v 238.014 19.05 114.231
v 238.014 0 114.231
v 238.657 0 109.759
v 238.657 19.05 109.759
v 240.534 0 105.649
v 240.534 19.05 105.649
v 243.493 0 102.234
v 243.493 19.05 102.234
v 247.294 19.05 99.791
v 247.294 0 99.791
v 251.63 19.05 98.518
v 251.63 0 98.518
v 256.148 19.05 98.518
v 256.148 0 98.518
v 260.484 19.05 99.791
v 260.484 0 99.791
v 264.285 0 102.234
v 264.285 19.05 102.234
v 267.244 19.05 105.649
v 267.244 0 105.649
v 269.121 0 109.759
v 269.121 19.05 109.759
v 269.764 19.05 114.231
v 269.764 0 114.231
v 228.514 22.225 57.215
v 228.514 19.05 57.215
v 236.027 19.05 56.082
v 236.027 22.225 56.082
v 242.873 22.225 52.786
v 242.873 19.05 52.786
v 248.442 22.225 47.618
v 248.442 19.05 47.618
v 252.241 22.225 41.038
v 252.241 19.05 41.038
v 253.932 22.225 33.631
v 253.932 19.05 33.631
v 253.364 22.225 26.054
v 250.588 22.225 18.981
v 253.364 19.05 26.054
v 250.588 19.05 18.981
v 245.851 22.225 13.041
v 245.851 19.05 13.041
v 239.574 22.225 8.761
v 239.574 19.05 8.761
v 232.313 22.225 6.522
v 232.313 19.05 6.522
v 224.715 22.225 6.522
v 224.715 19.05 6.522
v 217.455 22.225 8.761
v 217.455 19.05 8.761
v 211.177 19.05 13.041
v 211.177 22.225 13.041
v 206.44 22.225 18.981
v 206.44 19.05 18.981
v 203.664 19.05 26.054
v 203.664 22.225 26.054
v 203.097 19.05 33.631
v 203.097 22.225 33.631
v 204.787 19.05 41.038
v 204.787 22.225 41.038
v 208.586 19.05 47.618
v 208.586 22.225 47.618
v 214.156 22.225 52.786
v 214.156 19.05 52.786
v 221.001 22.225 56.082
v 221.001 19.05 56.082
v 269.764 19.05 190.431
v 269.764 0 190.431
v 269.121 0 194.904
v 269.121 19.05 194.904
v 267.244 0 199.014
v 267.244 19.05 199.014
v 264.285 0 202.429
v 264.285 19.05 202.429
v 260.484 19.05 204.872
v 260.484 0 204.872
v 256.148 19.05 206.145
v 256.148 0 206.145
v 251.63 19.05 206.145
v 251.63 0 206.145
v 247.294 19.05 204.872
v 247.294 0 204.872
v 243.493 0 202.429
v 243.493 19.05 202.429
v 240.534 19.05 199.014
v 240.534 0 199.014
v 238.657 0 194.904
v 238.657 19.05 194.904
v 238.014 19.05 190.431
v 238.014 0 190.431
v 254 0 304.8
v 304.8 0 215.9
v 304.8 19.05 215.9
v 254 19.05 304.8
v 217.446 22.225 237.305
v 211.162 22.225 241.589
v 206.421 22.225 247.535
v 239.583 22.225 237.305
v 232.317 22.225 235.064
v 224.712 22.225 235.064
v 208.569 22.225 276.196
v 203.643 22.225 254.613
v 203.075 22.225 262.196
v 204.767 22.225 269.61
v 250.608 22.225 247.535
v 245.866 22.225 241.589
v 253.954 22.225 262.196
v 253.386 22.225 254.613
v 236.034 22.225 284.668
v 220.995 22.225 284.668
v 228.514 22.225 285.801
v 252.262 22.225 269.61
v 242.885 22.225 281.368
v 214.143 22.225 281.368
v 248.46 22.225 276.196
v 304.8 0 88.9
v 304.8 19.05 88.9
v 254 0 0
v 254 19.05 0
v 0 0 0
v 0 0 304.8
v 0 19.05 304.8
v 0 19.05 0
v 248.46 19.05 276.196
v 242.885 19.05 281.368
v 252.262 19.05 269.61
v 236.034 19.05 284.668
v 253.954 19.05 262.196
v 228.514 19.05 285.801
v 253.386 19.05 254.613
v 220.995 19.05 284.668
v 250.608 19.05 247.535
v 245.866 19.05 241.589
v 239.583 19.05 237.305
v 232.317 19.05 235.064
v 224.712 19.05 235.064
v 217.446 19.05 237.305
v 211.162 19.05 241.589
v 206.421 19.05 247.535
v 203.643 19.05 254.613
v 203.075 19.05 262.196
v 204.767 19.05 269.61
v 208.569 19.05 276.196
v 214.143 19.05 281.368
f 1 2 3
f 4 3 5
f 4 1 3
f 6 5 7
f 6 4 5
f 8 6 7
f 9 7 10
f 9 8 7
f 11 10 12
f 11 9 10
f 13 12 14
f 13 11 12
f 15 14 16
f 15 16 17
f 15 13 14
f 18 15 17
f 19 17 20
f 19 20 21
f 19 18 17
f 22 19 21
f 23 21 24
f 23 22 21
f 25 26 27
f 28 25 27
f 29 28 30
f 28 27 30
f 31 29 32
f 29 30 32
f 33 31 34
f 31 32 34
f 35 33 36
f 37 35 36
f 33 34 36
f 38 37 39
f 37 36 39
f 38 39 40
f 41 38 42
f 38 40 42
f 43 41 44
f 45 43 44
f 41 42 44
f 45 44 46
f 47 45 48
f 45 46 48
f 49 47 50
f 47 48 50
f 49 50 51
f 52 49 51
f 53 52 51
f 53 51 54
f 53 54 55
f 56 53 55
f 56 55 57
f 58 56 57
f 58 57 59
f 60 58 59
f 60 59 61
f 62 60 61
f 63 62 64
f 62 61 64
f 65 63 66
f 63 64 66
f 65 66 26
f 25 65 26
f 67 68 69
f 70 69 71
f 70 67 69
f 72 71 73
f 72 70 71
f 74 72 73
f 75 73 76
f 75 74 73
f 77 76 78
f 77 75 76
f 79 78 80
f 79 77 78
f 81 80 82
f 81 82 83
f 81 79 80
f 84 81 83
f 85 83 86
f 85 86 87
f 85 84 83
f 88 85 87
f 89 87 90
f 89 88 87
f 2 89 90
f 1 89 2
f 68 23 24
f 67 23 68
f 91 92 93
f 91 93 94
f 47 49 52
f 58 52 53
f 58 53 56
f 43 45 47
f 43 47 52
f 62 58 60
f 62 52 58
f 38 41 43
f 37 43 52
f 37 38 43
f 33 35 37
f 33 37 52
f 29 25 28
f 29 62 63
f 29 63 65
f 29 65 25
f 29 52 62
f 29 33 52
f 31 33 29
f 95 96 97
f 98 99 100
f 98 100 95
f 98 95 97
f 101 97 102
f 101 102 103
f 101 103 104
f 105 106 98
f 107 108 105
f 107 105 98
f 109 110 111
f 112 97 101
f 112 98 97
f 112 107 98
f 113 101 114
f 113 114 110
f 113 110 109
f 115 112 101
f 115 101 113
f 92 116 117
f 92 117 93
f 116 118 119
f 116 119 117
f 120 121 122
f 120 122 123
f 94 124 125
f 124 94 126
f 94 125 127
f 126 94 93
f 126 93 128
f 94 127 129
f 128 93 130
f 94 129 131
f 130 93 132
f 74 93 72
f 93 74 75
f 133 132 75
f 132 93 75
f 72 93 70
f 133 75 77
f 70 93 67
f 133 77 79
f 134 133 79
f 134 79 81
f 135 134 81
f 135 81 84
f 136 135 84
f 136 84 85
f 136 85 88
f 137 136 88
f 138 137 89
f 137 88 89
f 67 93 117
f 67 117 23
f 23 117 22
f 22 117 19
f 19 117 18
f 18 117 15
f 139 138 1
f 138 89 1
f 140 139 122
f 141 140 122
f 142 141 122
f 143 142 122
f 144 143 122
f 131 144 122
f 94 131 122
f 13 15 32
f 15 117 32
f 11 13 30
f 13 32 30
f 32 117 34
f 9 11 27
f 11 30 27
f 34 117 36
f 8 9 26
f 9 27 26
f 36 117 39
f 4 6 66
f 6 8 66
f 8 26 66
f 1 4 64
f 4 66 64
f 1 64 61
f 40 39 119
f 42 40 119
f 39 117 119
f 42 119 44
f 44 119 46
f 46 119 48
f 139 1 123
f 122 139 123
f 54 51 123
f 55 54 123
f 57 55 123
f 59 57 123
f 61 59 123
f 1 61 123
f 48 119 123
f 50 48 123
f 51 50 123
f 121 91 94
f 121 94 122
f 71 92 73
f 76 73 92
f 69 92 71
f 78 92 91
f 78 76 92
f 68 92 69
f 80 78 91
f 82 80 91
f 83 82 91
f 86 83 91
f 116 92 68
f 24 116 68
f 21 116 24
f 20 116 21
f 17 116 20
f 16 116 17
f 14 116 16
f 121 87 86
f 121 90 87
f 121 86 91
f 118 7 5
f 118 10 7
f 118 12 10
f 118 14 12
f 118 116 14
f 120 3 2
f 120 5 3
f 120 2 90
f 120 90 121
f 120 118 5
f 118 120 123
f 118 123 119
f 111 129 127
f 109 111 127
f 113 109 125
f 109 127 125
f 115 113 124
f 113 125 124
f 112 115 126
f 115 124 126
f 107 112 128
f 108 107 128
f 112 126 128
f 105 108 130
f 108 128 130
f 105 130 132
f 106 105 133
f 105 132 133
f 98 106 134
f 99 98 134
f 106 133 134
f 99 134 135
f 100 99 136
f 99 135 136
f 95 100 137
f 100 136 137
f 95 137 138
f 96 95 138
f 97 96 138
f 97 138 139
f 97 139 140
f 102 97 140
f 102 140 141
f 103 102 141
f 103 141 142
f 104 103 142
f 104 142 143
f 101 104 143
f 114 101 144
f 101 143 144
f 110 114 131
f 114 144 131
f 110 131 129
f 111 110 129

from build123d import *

# Parameters (mm, degrees)
BOSS_EXTRUDE1_DEPTH = 19.05
SKETCH4_R           = 25.488945224
SKETCH4_R_2         = 25.511029354
BOSS_EXTRUDE2_DEPTH = 3.175
CUT_EXTRUDE1_DEPTH  = 19.05


with BuildPart() as part:
    # Sketch3 → Boss-Extrude1 (new body)
    with BuildSketch(Plane(origin=(0, 0, 0), x_dir=(1, 0, 0), z_dir=(0, 1, 0))):
        Polygon((0, 0), (254, 0), (304.8, -88.9), (304.8, -215.9), (254, -304.8), (0, -304.8), align=None)
    extrude(amount=BOSS_EXTRUDE1_DEPTH)

    # Sketch4 → Boss-Extrude2 (add)
    with BuildSketch(Plane(origin=(0, 19.05, 0), x_dir=(1, 0, 0), z_dir=(0, 1, 0))):
        with Locations(Location((228.514370998, -31.725840718, 0), (0, 0, 270))):
            Circle(SKETCH4_R)
        with Locations(Location((228.514370998, -260.290019102, 0), (0, 0, 270))):
            Circle(SKETCH4_R_2)
    extrude(amount=BOSS_EXTRUDE2_DEPTH)

    # Sketch5 → Cut-Extrude1 (cut)
    with BuildSketch(Plane(origin=(0, 19.05, 0), x_dir=(1, 0, 0), z_dir=(0, 1, 0))):
        with BuildLine():
            Line((269.763997266, -114.231353373), (269.763997266, -190.431353373))
            ThreePointArc((269.763997266, -190.431353373), (253.888997266, -206.306353373), (238.013997266, -190.431353373))
            Line((238.013997266, -190.431353373), (238.013997266, -114.231353373))
            ThreePointArc((238.013997266, -114.231353373), (253.888997266, -98.356353373), (269.763997266, -114.231353373))
        make_face()
    extrude(amount=-CUT_EXTRUDE1_DEPTH, mode=Mode.SUBTRACT)


solid = part.part
